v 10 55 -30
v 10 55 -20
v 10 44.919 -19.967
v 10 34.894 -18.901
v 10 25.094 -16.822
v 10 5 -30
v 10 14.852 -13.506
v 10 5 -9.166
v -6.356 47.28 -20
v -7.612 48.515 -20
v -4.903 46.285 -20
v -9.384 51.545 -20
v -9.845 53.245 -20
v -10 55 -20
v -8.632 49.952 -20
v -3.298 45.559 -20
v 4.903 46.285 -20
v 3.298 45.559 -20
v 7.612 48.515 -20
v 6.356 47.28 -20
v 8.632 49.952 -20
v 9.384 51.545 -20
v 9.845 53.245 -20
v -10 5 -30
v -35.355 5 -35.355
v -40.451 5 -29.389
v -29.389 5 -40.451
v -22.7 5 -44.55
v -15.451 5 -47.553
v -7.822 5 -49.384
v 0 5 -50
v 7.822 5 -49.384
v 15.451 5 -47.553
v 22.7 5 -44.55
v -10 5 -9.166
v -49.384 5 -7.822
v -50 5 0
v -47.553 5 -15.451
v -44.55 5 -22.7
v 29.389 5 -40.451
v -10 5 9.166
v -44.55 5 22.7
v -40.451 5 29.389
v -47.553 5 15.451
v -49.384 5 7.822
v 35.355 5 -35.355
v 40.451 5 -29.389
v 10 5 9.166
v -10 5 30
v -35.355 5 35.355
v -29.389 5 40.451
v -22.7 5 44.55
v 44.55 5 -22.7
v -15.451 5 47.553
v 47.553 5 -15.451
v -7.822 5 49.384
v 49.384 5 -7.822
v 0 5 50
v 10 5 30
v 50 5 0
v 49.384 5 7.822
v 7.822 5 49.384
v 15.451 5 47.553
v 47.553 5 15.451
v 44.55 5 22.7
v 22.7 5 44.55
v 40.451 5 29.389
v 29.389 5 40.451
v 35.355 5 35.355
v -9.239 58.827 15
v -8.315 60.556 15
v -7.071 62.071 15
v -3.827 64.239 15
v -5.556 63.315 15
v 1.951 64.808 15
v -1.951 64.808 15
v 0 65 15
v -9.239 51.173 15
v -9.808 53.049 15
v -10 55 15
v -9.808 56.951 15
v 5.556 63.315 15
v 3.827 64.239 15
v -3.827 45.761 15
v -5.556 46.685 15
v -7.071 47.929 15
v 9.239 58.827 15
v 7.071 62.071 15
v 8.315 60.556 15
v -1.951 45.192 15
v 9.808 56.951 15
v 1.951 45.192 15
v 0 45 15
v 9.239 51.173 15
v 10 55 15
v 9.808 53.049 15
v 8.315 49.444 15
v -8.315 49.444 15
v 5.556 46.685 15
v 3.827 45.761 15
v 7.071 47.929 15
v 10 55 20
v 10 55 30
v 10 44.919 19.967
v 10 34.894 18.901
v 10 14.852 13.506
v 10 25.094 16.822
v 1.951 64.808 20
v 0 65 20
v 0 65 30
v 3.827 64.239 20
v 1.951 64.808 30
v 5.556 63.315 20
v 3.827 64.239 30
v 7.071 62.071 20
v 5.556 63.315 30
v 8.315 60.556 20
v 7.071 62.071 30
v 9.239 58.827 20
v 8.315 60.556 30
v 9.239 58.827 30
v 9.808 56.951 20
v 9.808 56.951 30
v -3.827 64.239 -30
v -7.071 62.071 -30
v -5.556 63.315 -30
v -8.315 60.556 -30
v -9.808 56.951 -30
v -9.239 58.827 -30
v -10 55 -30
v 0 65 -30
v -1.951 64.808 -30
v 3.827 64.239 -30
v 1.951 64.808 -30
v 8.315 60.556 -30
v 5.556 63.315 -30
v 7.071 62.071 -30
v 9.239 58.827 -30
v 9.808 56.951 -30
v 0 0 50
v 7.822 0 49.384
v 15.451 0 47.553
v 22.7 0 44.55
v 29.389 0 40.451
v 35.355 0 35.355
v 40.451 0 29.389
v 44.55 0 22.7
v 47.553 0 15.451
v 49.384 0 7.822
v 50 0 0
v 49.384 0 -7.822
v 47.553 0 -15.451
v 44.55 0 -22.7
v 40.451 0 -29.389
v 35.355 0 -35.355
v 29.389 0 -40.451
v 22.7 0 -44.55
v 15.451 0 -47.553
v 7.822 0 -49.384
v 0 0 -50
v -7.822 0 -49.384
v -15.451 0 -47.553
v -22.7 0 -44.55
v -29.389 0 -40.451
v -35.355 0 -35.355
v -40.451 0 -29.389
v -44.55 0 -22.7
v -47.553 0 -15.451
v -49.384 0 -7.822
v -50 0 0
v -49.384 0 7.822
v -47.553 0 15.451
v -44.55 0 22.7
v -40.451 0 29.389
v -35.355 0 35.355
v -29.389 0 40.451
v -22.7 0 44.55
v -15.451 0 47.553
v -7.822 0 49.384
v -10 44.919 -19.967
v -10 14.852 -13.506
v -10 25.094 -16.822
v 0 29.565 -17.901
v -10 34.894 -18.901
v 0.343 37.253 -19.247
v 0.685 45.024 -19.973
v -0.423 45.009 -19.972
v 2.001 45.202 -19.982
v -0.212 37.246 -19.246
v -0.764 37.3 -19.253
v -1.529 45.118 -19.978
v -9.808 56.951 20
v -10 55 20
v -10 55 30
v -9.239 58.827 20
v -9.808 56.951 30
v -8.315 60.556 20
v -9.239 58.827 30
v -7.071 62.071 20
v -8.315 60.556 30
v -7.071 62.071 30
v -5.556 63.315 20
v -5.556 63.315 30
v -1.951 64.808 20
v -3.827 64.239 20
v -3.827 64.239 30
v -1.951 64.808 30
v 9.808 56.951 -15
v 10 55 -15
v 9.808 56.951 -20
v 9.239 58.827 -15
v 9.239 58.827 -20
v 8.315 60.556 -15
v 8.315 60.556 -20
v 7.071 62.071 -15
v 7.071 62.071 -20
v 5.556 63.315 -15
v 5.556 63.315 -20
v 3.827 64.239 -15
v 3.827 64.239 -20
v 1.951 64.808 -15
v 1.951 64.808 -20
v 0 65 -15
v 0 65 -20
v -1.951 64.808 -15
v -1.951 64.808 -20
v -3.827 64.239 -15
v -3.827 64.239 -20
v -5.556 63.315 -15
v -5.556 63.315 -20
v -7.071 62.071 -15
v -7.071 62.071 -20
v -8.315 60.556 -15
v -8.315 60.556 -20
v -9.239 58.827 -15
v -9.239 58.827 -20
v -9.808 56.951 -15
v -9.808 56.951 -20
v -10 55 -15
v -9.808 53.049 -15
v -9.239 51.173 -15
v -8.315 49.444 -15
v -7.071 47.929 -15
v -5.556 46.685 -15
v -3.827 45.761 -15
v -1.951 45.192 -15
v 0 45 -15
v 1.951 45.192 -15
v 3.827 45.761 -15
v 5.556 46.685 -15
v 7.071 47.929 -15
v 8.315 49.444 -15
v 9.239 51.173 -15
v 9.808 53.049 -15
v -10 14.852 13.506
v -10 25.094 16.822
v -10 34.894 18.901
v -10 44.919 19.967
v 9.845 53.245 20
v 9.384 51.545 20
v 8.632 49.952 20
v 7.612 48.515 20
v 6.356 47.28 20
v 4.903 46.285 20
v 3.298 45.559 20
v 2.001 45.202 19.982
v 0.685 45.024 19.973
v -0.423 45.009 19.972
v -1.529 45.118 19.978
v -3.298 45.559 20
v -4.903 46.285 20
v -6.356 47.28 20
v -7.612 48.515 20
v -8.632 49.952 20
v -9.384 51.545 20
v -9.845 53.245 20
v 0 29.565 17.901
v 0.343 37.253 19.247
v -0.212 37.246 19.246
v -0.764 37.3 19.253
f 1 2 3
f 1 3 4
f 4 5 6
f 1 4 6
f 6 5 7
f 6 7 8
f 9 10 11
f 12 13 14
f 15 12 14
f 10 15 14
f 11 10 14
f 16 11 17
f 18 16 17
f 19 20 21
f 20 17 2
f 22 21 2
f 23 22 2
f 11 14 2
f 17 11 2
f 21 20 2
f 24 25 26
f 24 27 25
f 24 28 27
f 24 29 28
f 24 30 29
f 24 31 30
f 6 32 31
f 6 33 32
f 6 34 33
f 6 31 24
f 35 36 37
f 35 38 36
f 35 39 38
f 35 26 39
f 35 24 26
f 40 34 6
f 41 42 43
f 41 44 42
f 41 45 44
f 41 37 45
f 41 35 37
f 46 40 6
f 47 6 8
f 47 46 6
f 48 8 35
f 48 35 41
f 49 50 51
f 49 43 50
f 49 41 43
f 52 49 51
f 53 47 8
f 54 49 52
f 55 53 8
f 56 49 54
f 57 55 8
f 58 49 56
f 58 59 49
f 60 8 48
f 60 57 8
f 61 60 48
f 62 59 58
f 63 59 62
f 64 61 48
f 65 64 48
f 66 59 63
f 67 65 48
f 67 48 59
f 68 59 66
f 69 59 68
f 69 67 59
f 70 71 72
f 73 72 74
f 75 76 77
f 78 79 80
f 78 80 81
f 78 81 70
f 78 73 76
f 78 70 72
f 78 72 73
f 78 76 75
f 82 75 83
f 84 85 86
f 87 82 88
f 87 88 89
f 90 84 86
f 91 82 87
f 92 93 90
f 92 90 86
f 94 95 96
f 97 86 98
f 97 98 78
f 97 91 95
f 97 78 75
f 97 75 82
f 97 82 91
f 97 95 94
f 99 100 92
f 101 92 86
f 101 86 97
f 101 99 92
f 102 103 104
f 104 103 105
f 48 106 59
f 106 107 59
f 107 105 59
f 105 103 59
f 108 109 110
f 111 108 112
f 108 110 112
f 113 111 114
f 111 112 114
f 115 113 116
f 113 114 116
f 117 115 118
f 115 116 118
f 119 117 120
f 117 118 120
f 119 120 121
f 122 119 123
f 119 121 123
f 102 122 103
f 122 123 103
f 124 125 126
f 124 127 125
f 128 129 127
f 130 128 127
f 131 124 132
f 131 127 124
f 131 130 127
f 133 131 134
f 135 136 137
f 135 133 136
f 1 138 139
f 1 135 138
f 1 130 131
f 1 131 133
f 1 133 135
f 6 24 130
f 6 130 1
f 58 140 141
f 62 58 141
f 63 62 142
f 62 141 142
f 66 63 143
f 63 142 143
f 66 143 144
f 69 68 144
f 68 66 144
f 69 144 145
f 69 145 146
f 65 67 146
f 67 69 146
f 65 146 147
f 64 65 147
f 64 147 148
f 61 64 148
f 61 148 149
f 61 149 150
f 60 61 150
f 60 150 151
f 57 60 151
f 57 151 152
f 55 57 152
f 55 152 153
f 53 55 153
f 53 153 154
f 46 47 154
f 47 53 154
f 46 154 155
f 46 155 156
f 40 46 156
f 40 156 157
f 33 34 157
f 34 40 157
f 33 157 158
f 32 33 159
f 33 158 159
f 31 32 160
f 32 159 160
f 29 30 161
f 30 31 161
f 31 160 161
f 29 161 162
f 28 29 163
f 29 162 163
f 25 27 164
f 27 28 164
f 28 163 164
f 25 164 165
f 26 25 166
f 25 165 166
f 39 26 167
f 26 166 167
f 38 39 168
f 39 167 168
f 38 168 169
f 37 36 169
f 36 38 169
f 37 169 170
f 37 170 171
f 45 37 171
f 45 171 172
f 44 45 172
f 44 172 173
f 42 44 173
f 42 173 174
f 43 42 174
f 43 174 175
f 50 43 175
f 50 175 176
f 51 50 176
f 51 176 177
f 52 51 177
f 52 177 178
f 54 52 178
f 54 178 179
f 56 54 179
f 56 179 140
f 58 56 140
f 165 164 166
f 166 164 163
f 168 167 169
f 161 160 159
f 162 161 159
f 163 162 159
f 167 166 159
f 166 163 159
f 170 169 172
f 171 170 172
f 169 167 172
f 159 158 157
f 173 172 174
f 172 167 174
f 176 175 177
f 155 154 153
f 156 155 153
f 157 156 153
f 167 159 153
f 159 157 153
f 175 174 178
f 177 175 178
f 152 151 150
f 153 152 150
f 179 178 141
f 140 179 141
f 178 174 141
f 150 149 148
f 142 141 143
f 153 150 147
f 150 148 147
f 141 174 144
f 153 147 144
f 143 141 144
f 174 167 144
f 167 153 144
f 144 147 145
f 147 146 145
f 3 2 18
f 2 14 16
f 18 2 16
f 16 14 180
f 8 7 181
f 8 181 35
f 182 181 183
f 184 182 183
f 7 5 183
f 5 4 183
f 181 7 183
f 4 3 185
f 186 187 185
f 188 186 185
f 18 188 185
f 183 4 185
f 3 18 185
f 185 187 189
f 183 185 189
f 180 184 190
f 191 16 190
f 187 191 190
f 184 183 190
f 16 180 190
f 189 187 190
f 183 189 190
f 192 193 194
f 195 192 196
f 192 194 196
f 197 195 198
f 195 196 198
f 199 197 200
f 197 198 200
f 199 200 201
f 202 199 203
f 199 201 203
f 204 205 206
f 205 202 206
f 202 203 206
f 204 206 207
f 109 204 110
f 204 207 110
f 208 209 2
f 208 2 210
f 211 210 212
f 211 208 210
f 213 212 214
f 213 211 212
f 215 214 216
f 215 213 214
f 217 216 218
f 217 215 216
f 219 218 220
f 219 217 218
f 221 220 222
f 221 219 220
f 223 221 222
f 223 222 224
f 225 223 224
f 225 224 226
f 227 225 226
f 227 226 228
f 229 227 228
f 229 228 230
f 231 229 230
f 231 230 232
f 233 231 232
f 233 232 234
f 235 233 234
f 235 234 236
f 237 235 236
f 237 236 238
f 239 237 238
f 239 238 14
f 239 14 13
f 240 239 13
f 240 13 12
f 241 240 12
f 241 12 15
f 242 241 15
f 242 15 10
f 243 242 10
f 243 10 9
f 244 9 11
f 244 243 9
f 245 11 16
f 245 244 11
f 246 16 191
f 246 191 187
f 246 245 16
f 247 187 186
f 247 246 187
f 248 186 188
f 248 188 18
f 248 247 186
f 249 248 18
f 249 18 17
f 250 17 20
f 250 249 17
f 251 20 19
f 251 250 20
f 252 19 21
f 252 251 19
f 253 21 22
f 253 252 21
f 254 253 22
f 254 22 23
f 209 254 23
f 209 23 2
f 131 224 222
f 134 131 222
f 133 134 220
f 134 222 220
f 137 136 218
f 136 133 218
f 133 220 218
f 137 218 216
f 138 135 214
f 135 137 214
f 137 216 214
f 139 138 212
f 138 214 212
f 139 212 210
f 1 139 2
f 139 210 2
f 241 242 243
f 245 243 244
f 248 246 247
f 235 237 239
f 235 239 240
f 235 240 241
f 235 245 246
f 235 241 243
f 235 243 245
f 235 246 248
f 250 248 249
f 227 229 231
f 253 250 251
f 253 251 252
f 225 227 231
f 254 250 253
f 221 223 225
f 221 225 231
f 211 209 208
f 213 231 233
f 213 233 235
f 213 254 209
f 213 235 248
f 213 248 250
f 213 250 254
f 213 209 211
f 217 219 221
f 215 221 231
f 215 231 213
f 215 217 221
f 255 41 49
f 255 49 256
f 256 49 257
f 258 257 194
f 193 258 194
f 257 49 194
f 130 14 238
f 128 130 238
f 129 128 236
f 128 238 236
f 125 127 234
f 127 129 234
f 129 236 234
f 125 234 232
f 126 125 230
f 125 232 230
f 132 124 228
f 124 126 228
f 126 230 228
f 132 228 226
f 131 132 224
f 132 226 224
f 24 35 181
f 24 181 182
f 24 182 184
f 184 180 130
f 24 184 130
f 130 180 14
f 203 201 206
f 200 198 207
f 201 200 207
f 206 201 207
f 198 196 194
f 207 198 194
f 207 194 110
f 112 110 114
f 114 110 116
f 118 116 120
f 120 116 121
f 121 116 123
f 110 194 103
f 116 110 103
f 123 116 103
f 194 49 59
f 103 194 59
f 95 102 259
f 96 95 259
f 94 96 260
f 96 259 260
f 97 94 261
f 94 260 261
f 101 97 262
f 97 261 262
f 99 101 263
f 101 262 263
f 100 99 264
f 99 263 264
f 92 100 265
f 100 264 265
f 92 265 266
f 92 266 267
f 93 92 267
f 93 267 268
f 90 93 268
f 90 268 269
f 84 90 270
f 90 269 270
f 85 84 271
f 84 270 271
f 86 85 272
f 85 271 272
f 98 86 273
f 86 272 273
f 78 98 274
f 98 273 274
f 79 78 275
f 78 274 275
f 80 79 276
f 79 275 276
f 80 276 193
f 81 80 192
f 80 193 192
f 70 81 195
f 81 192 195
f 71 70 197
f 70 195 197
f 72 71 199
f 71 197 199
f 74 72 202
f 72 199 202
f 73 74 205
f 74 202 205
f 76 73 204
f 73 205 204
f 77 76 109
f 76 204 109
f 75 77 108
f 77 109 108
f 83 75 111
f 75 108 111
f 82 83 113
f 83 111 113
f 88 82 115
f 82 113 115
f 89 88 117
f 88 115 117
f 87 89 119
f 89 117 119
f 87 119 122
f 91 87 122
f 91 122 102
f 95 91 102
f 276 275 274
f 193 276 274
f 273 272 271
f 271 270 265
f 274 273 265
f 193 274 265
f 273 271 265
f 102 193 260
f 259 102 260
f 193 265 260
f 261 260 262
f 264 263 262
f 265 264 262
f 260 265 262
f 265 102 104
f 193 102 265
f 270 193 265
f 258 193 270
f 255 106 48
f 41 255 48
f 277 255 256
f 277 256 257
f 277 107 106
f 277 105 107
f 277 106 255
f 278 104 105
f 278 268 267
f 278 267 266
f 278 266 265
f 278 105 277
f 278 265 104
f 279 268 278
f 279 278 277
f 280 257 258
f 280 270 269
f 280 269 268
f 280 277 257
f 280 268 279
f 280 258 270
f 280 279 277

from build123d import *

# Parameters (mm, degrees)
SKETCH2_R                = 50
BOSS_EXTRUDE1_DEPTH      = 5
SKETCH3_W                = 60
SKETCH3_H                = 60
BOSS_EXTRUDE2_DEPTH      = 60
CUT_EXTRUDE14_DEPTH      = 150
CUT_EXTRUDE15_DEPTH      = 150
CUT_EXTRUDE16_DEPTH      = 71
CUT_EXTRUDE16_DEPTH_BACK = 56
SKETCH31_R               = 10
BOSS_EXTRUDE5_DEPTH      = 5
BOSS_EXTRUDE6_START      = 5
SKETCH32_R               = 10
BOSS_EXTRUDE6_DEPTH      = 5


with BuildPart() as part:
    # Sketch2 → Boss-Extrude1 (new body)
    with BuildSketch(Plane(origin=(0, 0, 0), x_dir=(1, 0, 0), z_dir=(0, 1, 0))):
        with Locations(Location((0, 0, 0), (0, 0, 270))):
            Circle(SKETCH2_R)
    extrude(amount=BOSS_EXTRUDE1_DEPTH)

    # Sketch3 → Boss-Extrude2 (add)
    with BuildSketch(Plane(origin=(0, 5, 0), x_dir=(1, 0, 0), z_dir=(0, 1, 0))):
        Rectangle(SKETCH3_W, SKETCH3_H)
    extrude(amount=BOSS_EXTRUDE2_DEPTH)

    # Sketch19 → Cut-Extrude14 (cut)
    with BuildSketch(Plane.XY.offset(30)):
        with BuildLine():
            Line((-10, 5), (-10, 55))
            ThreePointArc((-10, 55), (-7.071067812, 62.071067812), (0, 65))
            Line((0, 65), (-30, 65))
            Line((-30, 65), (-30, 5))
            Line((-30, 5), (-10, 5))
        make_face()
    extrude(amount=-CUT_EXTRUDE14_DEPTH, mode=Mode.SUBTRACT)

    # Sketch29 → Cut-Extrude15 (cut)
    with BuildSketch(Plane.XY.offset(30)):
        with BuildLine():
            Line((30, 65), (0, 65))
            ThreePointArc((0, 65), (7.071067812, 62.071067812), (10, 55))
            Line((10, 55), (10, 5))
            Line((10, 5), (30, 5))
            Line((30, 5), (30, 65))
        make_face()
    extrude(amount=-CUT_EXTRUDE15_DEPTH, mode=Mode.SUBTRACT)

    # Sketch30 → Cut-Extrude16 (cut, two sides: drawn at the far end of the back side and taken through both)
    with BuildSketch(Plane(origin=(0, 0, 0), x_dir=(0, 0, -1), z_dir=(1, 0, 0)).offset(-CUT_EXTRUDE16_DEPTH_BACK)):
        with BuildLine():
            Line((20, 65), (-20, 65))
            Line((-20, 65), (-20, 55))
            add(Edge.make_bspline(
                [(-20, 55), (-21.218129455, 29.129128635), (-9.16621621, 5)],
                knots=[0, 0, 0, 1, 1, 1], degree=2))
            Line((-9.16621621, 5), (9.16621621, 5))
            add(Edge.make_bspline(
                [(20, 55), (21.218129455, 29.129128635), (9.16621621, 5)],
                knots=[0, 0, 0, 1, 1, 1], degree=2))
            Line((20, 55), (20, 65))
        make_face()
    extrude(amount=CUT_EXTRUDE16_DEPTH + CUT_EXTRUDE16_DEPTH_BACK, mode=Mode.SUBTRACT)

    # Sketch31 → Boss-Extrude5 (add)
    with BuildSketch(Plane(origin=(0, 0, 20), x_dir=(-1, 0, 0), z_dir=(0, 0, -1))):
        with Locations(Location((0, 55, 0), (0, 0, 180))):
            Circle(SKETCH31_R)
    extrude(amount=BOSS_EXTRUDE5_DEPTH)

    # Sketch32 → Boss-Extrude6 (add)
    with BuildSketch(Plane.XY.offset(-20).offset(BOSS_EXTRUDE6_START)):
        with Locations((0, 55)):
            Circle(SKETCH32_R)
    extrude(amount=-BOSS_EXTRUDE6_DEPTH)


solid = part.part
